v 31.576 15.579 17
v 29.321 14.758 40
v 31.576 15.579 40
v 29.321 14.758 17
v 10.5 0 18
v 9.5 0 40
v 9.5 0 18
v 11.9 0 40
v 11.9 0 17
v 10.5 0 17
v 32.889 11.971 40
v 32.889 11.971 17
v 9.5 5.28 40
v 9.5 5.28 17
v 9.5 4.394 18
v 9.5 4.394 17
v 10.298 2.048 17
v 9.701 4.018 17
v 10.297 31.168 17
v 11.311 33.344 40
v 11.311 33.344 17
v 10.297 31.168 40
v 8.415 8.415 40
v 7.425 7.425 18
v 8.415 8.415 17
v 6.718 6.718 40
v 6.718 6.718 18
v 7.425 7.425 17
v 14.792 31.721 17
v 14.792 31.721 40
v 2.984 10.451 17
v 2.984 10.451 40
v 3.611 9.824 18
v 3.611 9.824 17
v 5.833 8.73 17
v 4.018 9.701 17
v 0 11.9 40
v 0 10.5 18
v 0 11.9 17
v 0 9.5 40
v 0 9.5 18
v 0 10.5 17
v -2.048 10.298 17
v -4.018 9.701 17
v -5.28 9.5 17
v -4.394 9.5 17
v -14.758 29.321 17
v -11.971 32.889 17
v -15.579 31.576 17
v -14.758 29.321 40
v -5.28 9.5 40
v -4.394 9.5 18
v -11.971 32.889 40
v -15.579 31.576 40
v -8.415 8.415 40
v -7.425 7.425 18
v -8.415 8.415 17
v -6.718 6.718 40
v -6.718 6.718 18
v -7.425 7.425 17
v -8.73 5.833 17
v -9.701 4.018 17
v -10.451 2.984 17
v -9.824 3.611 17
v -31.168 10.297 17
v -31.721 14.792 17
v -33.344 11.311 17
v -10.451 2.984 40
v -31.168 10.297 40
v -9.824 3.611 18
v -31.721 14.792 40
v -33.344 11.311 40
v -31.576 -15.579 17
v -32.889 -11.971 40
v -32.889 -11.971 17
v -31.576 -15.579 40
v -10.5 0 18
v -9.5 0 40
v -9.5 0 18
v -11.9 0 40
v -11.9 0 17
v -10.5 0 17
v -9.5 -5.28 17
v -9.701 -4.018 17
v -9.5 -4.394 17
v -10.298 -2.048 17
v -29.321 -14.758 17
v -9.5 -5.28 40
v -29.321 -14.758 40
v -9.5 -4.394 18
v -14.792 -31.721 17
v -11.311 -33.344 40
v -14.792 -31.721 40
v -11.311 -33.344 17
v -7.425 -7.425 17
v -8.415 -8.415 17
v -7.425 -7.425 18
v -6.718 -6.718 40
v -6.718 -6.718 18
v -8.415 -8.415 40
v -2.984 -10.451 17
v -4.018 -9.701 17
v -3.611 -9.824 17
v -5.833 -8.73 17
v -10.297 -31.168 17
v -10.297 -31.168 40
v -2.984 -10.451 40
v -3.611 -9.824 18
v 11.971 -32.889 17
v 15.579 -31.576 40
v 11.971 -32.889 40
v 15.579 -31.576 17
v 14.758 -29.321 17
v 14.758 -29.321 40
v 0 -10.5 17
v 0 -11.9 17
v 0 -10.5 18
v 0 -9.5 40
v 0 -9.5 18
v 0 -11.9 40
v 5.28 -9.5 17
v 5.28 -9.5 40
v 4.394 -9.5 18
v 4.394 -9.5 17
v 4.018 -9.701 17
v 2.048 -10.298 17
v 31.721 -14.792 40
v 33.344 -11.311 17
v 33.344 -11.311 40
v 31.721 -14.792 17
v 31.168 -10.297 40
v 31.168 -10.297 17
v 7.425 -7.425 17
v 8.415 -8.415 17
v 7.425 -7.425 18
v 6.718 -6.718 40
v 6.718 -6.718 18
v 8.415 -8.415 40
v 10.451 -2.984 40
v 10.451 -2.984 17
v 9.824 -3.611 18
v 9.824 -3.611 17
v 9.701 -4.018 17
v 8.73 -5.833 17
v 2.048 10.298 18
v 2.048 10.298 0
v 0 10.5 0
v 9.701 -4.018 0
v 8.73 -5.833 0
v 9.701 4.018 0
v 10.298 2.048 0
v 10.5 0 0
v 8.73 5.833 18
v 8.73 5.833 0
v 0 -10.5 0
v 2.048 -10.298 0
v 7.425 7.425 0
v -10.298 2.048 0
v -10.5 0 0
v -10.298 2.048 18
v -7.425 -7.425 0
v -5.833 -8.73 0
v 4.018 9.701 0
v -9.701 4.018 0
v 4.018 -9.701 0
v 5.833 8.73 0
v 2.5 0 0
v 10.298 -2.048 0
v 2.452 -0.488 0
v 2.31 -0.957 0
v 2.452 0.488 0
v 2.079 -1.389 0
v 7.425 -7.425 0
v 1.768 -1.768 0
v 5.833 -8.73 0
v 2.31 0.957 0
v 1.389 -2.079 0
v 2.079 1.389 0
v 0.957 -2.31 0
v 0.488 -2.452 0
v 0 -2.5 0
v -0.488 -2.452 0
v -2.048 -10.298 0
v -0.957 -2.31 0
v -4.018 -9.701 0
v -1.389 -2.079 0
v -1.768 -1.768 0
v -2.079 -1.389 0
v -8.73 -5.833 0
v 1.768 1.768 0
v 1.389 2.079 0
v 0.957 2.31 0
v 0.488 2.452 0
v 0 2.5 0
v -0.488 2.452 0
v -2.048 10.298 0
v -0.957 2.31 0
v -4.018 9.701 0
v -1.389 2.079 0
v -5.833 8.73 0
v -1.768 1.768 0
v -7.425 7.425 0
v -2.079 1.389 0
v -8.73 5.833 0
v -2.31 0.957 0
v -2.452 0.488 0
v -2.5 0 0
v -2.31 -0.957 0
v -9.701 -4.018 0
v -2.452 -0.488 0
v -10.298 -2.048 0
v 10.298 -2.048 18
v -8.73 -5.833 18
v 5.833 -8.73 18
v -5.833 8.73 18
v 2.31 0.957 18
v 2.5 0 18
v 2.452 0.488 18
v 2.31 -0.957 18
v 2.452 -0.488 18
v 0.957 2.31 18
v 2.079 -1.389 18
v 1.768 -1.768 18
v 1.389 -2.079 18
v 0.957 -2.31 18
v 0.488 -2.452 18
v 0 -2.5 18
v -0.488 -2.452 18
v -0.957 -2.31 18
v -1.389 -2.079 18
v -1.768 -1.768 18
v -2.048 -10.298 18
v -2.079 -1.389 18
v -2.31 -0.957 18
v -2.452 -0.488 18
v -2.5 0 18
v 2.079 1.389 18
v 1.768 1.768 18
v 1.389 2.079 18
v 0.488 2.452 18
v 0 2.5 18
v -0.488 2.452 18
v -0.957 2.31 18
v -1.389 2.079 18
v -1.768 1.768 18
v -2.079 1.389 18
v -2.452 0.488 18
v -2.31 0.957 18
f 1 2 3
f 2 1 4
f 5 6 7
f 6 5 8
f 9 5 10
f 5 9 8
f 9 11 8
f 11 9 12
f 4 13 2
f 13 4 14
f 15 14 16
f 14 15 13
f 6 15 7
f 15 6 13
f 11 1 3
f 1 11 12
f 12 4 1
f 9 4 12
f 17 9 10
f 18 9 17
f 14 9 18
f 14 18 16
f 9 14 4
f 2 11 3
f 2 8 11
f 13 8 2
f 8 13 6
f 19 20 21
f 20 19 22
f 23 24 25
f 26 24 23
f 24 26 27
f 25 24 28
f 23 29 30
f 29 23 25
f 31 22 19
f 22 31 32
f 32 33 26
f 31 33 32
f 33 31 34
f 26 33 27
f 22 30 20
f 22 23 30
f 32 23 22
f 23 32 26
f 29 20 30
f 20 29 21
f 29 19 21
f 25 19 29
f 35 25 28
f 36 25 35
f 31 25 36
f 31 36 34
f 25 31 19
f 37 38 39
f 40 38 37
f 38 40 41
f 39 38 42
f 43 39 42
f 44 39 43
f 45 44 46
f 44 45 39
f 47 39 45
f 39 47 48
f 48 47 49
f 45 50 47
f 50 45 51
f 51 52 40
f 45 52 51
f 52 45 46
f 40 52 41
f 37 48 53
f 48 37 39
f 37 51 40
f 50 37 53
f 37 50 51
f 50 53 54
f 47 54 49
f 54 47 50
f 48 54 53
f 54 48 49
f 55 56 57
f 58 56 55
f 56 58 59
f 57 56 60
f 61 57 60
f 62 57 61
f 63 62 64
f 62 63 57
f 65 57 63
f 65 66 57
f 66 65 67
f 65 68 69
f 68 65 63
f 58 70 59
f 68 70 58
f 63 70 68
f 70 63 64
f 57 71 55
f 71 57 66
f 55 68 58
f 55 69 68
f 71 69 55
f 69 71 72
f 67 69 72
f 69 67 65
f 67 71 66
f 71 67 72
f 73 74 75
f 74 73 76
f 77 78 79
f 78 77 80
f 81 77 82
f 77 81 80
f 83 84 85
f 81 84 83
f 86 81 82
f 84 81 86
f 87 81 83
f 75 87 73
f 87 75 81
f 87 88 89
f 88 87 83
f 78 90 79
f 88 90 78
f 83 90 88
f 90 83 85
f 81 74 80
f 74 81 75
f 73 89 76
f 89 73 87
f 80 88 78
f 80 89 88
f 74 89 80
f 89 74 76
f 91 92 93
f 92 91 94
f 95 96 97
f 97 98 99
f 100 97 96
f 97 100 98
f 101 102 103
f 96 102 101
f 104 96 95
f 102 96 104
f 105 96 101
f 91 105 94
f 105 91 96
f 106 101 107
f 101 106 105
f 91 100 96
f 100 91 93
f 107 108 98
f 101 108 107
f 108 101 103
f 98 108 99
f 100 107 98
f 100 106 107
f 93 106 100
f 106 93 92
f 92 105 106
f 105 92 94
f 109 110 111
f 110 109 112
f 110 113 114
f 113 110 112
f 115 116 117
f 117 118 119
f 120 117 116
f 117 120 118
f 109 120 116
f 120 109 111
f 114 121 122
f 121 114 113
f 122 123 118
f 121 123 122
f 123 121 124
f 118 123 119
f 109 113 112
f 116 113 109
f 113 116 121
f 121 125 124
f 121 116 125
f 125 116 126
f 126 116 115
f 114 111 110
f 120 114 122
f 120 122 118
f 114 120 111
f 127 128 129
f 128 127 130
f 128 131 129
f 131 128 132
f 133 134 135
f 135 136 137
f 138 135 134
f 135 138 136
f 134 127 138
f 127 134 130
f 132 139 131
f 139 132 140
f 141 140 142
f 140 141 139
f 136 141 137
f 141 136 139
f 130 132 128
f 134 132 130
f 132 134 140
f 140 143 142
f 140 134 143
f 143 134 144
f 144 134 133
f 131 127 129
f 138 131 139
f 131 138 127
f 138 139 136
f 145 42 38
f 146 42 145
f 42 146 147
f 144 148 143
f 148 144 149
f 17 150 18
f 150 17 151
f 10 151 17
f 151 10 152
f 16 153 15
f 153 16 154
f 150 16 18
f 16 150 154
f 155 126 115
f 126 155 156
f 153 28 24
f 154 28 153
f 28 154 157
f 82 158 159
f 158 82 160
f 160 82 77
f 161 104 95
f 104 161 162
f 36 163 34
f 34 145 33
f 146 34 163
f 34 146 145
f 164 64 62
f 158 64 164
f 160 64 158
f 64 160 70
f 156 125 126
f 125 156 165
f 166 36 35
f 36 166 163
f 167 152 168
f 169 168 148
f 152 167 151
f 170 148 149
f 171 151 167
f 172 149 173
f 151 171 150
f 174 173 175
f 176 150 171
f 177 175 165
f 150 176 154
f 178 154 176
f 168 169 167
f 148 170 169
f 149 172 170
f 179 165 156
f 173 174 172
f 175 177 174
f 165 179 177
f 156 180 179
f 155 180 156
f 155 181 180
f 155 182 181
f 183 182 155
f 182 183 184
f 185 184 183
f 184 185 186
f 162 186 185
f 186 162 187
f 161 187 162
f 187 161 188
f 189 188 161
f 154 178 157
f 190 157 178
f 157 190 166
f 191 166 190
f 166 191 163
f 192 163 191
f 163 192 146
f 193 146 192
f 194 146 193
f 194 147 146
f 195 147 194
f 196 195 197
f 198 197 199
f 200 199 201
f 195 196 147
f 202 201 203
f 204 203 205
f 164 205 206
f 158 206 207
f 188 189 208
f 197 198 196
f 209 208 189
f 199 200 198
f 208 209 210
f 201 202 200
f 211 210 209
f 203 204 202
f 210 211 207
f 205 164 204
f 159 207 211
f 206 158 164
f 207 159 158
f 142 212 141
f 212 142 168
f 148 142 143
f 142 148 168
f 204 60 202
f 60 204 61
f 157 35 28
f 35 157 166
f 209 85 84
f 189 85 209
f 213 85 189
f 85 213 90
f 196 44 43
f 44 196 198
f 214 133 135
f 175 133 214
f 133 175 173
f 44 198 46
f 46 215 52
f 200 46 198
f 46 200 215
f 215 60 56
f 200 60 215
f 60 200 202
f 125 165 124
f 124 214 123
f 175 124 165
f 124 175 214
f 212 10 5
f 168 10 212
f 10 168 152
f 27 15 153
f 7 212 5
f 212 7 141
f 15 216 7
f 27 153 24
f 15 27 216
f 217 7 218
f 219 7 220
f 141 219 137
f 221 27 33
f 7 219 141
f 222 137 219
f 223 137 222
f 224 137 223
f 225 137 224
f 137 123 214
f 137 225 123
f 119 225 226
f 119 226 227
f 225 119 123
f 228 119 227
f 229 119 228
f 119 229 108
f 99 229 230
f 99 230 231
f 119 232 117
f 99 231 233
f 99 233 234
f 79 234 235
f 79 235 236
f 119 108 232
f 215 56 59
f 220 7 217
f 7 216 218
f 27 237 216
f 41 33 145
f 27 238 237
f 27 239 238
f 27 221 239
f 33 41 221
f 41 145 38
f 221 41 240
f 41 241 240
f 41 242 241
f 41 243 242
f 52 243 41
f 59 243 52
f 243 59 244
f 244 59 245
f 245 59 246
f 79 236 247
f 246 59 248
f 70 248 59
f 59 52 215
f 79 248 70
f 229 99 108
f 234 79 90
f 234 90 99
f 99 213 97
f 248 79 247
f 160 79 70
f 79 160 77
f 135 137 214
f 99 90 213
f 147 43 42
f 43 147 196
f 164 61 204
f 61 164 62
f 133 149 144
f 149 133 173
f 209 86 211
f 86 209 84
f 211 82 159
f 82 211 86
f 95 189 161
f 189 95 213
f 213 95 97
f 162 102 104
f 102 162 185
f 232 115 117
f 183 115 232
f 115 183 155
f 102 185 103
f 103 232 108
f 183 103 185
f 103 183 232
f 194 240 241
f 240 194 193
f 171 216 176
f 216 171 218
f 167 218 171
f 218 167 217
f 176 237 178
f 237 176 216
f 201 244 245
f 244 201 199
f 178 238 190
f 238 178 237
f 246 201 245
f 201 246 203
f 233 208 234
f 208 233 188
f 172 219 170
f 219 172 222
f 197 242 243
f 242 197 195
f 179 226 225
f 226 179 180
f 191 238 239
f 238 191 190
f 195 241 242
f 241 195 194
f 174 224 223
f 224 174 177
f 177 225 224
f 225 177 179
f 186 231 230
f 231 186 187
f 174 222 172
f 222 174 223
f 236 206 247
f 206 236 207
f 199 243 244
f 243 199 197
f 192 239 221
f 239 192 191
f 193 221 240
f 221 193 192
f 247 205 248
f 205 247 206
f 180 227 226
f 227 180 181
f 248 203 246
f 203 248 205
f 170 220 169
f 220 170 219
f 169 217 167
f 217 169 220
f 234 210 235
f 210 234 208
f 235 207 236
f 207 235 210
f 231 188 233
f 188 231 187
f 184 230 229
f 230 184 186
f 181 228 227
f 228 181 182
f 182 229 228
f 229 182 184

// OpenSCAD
$fn = 32;

// ----------------------------------------------------------------------
// Impeller: 70 mm, 8 blades, 40 mm tall
// ----------------------------------------------------------------------

// --- parameters (mm) ---
hub_d = 21;               // hub diameter
hub_h = 18;               // hub height
imp_d = 70;               // outer diameter over the blades
blades = 8;               // number of blades
blade_t = 2.4;            // blade thickness
blade_h = 22;             // blade height
blade_in_r = 9.5;         // blade root radius
blade_out_r = 32.6;       // blade tip radius
sweep = 20;               // blade sweep, degrees
bore_d = 5;               // shaft bore

module hub() {
  cylinder(h = hub_h, d = hub_d);
}

module blade() {
  /* blade swept between two boxes: hull of the root and the tip section */
  hull() {
    translate([blade_in_r, 0, hub_h - 1])
      cube([blade_t, blade_t * 2.2, blade_h + 1], center = false);
    rotate([0, 0, sweep])
      translate([blade_out_r, 0, hub_h - 1])
        cube([blade_t, blade_t * 1.6, blade_h + 1], center = false);
  }
}

module blades() {
  for (i = [0 : blades - 1])
    rotate([0, 0, i * 360 / blades]) blade();
}

difference() {
  union() {
    hub();
    blades();
  }
  translate([0, 0, -1]) cylinder(h = hub_h + blade_h + 0 + 3, d = bore_d);
}
